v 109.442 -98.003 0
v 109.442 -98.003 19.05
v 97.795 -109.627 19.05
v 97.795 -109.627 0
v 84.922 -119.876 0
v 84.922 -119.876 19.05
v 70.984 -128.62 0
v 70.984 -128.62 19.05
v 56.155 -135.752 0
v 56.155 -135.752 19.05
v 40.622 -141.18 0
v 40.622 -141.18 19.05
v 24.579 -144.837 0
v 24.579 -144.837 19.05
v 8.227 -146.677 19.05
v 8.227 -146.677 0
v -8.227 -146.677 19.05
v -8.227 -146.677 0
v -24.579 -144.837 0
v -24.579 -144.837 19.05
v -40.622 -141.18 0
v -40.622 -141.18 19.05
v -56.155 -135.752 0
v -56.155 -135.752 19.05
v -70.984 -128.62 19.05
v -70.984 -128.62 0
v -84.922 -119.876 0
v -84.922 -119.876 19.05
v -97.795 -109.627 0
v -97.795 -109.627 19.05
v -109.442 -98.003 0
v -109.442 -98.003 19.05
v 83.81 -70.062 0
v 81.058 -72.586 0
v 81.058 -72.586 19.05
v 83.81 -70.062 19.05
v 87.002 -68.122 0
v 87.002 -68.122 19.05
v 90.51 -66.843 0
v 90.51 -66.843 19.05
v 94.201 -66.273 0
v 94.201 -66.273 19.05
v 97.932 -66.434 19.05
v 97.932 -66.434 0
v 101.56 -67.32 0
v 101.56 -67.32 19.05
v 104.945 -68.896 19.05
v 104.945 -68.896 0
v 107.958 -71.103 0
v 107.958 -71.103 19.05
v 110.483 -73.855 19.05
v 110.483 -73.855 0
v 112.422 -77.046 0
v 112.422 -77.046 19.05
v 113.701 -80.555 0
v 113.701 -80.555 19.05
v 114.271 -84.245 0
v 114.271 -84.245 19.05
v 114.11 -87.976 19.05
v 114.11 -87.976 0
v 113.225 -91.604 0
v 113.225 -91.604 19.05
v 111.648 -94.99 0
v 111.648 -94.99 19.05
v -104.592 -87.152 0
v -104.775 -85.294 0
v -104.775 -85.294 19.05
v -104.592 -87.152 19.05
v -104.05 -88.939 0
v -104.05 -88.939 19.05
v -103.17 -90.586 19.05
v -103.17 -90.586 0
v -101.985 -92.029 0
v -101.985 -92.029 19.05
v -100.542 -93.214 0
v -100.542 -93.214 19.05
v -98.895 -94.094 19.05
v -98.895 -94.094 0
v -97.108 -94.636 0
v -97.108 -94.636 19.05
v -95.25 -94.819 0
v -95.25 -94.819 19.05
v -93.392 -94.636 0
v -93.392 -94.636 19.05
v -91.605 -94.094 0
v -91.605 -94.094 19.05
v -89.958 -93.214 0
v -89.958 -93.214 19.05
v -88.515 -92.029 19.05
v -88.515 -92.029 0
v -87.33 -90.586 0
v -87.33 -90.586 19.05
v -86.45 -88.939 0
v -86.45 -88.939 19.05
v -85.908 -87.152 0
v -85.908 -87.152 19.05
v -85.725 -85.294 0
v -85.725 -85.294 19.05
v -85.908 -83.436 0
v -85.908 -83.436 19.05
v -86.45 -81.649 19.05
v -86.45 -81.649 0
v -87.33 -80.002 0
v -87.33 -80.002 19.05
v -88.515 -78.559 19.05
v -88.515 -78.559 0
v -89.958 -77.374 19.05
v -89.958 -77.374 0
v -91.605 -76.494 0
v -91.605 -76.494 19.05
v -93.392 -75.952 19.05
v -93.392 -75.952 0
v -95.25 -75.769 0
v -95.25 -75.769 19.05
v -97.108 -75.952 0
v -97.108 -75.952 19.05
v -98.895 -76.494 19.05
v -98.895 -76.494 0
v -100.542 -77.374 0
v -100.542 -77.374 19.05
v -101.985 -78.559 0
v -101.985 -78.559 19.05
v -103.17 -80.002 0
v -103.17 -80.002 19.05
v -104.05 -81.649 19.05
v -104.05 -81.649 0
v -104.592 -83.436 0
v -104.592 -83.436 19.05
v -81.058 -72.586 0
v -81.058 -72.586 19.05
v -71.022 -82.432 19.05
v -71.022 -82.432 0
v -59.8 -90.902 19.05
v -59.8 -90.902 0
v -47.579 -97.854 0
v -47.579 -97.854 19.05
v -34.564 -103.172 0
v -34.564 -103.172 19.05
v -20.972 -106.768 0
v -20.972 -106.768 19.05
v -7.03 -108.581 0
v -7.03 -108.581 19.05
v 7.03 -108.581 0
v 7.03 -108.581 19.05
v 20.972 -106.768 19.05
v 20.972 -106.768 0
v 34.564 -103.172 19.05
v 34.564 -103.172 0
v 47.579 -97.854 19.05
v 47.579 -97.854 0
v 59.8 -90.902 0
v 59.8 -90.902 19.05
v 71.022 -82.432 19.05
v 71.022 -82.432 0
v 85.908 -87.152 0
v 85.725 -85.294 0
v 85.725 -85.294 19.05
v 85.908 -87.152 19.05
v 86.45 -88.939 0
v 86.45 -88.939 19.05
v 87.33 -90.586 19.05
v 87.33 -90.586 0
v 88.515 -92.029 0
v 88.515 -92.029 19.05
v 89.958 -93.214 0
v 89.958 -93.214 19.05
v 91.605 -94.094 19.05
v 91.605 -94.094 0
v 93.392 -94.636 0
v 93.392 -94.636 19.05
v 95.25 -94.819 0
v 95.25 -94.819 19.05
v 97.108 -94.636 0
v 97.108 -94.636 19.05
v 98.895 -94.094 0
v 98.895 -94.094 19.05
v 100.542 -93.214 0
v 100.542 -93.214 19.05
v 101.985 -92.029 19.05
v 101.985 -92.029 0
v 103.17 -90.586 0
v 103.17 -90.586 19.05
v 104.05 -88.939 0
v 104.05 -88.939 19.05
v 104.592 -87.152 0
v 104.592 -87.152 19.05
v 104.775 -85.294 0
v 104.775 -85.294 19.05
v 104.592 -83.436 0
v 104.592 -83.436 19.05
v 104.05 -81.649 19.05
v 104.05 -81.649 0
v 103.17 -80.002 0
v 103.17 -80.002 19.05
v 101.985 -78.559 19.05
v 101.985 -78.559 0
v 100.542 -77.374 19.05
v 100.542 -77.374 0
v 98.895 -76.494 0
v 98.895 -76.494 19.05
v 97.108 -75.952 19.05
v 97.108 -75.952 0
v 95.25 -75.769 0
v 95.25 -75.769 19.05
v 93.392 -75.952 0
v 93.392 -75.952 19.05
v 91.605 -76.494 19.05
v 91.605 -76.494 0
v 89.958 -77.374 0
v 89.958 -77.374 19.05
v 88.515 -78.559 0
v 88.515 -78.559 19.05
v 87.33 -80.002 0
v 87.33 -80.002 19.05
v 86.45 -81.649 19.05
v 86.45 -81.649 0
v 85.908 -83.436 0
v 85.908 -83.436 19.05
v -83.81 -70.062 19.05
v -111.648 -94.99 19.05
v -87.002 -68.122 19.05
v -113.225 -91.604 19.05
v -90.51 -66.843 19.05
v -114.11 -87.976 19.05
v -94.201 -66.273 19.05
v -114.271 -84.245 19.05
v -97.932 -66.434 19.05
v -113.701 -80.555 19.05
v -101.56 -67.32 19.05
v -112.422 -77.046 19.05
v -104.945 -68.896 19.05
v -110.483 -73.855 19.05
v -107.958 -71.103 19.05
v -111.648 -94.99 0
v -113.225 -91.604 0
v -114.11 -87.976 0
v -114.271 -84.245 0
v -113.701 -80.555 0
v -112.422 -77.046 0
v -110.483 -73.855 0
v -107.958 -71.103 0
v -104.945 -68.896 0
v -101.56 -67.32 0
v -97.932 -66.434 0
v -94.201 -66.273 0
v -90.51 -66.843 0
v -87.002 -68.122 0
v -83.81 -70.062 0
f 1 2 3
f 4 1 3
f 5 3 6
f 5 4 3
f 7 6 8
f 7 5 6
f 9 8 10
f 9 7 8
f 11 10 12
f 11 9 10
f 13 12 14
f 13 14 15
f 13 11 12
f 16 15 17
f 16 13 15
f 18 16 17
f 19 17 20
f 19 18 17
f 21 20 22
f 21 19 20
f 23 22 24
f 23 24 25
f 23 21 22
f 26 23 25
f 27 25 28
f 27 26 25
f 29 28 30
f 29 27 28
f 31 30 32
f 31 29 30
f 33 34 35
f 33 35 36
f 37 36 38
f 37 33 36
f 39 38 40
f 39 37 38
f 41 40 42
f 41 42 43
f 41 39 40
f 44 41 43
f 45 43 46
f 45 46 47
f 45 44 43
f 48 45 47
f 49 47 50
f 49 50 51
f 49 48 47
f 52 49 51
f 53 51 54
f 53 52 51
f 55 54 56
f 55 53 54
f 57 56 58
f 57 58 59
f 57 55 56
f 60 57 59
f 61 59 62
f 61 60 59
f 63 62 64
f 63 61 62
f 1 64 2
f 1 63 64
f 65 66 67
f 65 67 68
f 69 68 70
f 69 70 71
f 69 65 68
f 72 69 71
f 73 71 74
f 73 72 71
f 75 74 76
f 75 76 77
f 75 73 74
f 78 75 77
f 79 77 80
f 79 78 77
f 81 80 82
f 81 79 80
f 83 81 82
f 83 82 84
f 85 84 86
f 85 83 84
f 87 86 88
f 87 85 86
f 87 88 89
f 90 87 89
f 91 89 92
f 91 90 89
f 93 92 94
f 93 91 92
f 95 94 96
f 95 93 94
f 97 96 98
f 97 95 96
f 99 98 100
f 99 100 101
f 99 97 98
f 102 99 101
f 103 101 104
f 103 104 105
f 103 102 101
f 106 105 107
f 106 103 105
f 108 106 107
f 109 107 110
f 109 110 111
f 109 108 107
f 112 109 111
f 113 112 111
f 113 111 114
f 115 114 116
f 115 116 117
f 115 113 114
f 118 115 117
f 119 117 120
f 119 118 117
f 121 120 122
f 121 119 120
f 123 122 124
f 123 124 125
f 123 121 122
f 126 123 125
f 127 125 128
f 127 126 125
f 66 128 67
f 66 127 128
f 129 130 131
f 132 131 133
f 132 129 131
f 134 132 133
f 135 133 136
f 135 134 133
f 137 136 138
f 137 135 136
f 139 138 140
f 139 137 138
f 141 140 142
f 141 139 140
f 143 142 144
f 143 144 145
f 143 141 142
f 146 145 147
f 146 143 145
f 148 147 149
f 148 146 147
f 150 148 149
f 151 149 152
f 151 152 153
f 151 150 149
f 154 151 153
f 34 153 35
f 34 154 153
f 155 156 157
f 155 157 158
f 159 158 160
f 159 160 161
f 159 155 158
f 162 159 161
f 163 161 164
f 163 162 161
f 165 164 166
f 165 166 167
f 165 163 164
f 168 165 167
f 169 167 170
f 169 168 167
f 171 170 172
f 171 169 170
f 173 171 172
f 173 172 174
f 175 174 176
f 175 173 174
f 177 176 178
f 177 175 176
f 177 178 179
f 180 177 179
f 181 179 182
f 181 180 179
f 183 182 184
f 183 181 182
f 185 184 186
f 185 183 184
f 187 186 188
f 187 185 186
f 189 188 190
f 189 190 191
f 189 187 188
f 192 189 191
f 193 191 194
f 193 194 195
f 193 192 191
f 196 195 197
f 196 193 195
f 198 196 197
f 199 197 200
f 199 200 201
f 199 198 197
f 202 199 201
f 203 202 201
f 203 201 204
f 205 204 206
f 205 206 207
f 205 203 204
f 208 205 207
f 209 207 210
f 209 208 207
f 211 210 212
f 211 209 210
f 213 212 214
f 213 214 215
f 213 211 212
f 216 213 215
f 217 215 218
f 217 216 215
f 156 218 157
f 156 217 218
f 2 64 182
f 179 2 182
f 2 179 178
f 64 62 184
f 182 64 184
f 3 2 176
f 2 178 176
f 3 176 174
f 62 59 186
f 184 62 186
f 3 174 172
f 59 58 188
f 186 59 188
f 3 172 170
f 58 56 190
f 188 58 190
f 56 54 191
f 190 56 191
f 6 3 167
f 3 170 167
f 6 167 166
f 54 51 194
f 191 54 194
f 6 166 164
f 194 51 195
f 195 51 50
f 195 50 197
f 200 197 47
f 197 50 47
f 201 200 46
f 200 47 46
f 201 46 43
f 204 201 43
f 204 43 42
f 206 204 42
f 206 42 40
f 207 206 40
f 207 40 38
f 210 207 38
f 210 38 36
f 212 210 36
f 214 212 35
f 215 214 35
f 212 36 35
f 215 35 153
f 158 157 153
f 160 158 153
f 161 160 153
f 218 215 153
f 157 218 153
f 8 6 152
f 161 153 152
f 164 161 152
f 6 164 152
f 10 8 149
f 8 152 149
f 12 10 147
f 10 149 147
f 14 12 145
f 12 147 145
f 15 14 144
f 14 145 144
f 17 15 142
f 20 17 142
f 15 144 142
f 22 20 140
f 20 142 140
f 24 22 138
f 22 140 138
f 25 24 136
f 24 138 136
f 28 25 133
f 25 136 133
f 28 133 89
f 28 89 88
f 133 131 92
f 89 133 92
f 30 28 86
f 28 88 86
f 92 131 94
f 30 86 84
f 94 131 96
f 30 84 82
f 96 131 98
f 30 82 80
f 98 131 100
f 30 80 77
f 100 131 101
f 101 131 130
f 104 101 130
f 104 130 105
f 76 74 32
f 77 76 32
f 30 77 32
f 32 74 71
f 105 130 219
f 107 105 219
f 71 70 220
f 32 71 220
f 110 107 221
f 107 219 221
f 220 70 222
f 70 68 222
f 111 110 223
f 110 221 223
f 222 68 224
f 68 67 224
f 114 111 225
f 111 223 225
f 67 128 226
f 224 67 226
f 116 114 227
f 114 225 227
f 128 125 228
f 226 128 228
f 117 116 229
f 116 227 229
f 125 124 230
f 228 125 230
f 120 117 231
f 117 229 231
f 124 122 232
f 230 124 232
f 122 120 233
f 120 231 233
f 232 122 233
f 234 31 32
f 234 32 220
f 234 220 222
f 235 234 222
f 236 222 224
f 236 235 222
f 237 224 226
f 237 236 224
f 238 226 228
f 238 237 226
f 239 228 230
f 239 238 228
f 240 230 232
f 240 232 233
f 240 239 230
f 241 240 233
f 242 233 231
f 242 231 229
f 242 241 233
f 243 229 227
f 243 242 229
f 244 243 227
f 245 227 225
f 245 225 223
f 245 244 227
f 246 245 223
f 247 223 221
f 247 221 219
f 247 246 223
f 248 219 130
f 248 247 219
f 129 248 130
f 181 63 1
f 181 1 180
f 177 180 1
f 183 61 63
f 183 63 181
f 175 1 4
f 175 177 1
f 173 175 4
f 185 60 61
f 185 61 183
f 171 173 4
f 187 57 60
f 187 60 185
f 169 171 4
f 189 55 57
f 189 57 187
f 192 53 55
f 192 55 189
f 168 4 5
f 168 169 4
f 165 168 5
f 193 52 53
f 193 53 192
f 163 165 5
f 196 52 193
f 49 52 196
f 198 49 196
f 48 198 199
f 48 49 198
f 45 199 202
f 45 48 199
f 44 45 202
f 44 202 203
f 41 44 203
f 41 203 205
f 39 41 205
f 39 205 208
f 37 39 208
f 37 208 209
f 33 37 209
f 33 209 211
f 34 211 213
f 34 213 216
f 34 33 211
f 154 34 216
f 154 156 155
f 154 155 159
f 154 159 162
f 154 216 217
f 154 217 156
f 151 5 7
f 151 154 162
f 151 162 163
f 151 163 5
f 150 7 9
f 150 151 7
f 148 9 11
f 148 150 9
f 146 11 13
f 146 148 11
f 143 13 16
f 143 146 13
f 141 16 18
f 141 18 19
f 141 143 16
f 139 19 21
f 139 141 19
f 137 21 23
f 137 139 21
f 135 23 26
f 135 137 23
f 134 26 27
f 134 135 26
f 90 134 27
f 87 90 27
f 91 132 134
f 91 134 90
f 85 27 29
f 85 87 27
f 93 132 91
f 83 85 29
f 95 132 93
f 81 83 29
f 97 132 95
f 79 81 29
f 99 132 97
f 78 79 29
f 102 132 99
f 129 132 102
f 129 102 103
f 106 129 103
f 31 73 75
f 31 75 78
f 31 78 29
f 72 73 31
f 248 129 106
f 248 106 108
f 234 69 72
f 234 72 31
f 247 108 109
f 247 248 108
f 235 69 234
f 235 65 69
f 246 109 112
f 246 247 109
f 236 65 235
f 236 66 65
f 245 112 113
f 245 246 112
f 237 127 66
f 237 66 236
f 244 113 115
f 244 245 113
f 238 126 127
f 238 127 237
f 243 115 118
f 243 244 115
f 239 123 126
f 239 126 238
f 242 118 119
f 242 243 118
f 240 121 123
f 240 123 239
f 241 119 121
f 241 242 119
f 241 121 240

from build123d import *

# Parameters (mm, degrees)
SKETCH1_R           = 9.525
BOSS_EXTRUDE1_DEPTH = 19.05


with BuildPart() as part:
    # Sketch1 → Boss-Extrude1 (new body)
    with BuildSketch(Plane.XY):
        with BuildLine():
            ThreePointArc((81.058378375, -72.585965178), (107.958279807, -71.10262336), (109.441621625, -98.002524792))
            ThreePointArc((109.441621625, -98.002524792), (0, -146.908010025), (-109.441621625, -98.002524792))
            ThreePointArc((-109.441621625, -98.002524792), (-107.958279807, -71.10262336), (-81.058378375, -72.585965178))
            ThreePointArc((-81.058378375, -72.585965178), (0, -108.808010025), (81.058378375, -72.585965178))
        make_face()
        with Locations(Location((-95.25, -85.294244985, 0), (0, 0, 180))):
            Circle(SKETCH1_R, mode=Mode.SUBTRACT)
        with Locations(Location((95.25, -85.294244985, 0), (0, 0, 180))):
            Circle(SKETCH1_R, mode=Mode.SUBTRACT)
    extrude(amount=BOSS_EXTRUDE1_DEPTH)


solid = part.part
